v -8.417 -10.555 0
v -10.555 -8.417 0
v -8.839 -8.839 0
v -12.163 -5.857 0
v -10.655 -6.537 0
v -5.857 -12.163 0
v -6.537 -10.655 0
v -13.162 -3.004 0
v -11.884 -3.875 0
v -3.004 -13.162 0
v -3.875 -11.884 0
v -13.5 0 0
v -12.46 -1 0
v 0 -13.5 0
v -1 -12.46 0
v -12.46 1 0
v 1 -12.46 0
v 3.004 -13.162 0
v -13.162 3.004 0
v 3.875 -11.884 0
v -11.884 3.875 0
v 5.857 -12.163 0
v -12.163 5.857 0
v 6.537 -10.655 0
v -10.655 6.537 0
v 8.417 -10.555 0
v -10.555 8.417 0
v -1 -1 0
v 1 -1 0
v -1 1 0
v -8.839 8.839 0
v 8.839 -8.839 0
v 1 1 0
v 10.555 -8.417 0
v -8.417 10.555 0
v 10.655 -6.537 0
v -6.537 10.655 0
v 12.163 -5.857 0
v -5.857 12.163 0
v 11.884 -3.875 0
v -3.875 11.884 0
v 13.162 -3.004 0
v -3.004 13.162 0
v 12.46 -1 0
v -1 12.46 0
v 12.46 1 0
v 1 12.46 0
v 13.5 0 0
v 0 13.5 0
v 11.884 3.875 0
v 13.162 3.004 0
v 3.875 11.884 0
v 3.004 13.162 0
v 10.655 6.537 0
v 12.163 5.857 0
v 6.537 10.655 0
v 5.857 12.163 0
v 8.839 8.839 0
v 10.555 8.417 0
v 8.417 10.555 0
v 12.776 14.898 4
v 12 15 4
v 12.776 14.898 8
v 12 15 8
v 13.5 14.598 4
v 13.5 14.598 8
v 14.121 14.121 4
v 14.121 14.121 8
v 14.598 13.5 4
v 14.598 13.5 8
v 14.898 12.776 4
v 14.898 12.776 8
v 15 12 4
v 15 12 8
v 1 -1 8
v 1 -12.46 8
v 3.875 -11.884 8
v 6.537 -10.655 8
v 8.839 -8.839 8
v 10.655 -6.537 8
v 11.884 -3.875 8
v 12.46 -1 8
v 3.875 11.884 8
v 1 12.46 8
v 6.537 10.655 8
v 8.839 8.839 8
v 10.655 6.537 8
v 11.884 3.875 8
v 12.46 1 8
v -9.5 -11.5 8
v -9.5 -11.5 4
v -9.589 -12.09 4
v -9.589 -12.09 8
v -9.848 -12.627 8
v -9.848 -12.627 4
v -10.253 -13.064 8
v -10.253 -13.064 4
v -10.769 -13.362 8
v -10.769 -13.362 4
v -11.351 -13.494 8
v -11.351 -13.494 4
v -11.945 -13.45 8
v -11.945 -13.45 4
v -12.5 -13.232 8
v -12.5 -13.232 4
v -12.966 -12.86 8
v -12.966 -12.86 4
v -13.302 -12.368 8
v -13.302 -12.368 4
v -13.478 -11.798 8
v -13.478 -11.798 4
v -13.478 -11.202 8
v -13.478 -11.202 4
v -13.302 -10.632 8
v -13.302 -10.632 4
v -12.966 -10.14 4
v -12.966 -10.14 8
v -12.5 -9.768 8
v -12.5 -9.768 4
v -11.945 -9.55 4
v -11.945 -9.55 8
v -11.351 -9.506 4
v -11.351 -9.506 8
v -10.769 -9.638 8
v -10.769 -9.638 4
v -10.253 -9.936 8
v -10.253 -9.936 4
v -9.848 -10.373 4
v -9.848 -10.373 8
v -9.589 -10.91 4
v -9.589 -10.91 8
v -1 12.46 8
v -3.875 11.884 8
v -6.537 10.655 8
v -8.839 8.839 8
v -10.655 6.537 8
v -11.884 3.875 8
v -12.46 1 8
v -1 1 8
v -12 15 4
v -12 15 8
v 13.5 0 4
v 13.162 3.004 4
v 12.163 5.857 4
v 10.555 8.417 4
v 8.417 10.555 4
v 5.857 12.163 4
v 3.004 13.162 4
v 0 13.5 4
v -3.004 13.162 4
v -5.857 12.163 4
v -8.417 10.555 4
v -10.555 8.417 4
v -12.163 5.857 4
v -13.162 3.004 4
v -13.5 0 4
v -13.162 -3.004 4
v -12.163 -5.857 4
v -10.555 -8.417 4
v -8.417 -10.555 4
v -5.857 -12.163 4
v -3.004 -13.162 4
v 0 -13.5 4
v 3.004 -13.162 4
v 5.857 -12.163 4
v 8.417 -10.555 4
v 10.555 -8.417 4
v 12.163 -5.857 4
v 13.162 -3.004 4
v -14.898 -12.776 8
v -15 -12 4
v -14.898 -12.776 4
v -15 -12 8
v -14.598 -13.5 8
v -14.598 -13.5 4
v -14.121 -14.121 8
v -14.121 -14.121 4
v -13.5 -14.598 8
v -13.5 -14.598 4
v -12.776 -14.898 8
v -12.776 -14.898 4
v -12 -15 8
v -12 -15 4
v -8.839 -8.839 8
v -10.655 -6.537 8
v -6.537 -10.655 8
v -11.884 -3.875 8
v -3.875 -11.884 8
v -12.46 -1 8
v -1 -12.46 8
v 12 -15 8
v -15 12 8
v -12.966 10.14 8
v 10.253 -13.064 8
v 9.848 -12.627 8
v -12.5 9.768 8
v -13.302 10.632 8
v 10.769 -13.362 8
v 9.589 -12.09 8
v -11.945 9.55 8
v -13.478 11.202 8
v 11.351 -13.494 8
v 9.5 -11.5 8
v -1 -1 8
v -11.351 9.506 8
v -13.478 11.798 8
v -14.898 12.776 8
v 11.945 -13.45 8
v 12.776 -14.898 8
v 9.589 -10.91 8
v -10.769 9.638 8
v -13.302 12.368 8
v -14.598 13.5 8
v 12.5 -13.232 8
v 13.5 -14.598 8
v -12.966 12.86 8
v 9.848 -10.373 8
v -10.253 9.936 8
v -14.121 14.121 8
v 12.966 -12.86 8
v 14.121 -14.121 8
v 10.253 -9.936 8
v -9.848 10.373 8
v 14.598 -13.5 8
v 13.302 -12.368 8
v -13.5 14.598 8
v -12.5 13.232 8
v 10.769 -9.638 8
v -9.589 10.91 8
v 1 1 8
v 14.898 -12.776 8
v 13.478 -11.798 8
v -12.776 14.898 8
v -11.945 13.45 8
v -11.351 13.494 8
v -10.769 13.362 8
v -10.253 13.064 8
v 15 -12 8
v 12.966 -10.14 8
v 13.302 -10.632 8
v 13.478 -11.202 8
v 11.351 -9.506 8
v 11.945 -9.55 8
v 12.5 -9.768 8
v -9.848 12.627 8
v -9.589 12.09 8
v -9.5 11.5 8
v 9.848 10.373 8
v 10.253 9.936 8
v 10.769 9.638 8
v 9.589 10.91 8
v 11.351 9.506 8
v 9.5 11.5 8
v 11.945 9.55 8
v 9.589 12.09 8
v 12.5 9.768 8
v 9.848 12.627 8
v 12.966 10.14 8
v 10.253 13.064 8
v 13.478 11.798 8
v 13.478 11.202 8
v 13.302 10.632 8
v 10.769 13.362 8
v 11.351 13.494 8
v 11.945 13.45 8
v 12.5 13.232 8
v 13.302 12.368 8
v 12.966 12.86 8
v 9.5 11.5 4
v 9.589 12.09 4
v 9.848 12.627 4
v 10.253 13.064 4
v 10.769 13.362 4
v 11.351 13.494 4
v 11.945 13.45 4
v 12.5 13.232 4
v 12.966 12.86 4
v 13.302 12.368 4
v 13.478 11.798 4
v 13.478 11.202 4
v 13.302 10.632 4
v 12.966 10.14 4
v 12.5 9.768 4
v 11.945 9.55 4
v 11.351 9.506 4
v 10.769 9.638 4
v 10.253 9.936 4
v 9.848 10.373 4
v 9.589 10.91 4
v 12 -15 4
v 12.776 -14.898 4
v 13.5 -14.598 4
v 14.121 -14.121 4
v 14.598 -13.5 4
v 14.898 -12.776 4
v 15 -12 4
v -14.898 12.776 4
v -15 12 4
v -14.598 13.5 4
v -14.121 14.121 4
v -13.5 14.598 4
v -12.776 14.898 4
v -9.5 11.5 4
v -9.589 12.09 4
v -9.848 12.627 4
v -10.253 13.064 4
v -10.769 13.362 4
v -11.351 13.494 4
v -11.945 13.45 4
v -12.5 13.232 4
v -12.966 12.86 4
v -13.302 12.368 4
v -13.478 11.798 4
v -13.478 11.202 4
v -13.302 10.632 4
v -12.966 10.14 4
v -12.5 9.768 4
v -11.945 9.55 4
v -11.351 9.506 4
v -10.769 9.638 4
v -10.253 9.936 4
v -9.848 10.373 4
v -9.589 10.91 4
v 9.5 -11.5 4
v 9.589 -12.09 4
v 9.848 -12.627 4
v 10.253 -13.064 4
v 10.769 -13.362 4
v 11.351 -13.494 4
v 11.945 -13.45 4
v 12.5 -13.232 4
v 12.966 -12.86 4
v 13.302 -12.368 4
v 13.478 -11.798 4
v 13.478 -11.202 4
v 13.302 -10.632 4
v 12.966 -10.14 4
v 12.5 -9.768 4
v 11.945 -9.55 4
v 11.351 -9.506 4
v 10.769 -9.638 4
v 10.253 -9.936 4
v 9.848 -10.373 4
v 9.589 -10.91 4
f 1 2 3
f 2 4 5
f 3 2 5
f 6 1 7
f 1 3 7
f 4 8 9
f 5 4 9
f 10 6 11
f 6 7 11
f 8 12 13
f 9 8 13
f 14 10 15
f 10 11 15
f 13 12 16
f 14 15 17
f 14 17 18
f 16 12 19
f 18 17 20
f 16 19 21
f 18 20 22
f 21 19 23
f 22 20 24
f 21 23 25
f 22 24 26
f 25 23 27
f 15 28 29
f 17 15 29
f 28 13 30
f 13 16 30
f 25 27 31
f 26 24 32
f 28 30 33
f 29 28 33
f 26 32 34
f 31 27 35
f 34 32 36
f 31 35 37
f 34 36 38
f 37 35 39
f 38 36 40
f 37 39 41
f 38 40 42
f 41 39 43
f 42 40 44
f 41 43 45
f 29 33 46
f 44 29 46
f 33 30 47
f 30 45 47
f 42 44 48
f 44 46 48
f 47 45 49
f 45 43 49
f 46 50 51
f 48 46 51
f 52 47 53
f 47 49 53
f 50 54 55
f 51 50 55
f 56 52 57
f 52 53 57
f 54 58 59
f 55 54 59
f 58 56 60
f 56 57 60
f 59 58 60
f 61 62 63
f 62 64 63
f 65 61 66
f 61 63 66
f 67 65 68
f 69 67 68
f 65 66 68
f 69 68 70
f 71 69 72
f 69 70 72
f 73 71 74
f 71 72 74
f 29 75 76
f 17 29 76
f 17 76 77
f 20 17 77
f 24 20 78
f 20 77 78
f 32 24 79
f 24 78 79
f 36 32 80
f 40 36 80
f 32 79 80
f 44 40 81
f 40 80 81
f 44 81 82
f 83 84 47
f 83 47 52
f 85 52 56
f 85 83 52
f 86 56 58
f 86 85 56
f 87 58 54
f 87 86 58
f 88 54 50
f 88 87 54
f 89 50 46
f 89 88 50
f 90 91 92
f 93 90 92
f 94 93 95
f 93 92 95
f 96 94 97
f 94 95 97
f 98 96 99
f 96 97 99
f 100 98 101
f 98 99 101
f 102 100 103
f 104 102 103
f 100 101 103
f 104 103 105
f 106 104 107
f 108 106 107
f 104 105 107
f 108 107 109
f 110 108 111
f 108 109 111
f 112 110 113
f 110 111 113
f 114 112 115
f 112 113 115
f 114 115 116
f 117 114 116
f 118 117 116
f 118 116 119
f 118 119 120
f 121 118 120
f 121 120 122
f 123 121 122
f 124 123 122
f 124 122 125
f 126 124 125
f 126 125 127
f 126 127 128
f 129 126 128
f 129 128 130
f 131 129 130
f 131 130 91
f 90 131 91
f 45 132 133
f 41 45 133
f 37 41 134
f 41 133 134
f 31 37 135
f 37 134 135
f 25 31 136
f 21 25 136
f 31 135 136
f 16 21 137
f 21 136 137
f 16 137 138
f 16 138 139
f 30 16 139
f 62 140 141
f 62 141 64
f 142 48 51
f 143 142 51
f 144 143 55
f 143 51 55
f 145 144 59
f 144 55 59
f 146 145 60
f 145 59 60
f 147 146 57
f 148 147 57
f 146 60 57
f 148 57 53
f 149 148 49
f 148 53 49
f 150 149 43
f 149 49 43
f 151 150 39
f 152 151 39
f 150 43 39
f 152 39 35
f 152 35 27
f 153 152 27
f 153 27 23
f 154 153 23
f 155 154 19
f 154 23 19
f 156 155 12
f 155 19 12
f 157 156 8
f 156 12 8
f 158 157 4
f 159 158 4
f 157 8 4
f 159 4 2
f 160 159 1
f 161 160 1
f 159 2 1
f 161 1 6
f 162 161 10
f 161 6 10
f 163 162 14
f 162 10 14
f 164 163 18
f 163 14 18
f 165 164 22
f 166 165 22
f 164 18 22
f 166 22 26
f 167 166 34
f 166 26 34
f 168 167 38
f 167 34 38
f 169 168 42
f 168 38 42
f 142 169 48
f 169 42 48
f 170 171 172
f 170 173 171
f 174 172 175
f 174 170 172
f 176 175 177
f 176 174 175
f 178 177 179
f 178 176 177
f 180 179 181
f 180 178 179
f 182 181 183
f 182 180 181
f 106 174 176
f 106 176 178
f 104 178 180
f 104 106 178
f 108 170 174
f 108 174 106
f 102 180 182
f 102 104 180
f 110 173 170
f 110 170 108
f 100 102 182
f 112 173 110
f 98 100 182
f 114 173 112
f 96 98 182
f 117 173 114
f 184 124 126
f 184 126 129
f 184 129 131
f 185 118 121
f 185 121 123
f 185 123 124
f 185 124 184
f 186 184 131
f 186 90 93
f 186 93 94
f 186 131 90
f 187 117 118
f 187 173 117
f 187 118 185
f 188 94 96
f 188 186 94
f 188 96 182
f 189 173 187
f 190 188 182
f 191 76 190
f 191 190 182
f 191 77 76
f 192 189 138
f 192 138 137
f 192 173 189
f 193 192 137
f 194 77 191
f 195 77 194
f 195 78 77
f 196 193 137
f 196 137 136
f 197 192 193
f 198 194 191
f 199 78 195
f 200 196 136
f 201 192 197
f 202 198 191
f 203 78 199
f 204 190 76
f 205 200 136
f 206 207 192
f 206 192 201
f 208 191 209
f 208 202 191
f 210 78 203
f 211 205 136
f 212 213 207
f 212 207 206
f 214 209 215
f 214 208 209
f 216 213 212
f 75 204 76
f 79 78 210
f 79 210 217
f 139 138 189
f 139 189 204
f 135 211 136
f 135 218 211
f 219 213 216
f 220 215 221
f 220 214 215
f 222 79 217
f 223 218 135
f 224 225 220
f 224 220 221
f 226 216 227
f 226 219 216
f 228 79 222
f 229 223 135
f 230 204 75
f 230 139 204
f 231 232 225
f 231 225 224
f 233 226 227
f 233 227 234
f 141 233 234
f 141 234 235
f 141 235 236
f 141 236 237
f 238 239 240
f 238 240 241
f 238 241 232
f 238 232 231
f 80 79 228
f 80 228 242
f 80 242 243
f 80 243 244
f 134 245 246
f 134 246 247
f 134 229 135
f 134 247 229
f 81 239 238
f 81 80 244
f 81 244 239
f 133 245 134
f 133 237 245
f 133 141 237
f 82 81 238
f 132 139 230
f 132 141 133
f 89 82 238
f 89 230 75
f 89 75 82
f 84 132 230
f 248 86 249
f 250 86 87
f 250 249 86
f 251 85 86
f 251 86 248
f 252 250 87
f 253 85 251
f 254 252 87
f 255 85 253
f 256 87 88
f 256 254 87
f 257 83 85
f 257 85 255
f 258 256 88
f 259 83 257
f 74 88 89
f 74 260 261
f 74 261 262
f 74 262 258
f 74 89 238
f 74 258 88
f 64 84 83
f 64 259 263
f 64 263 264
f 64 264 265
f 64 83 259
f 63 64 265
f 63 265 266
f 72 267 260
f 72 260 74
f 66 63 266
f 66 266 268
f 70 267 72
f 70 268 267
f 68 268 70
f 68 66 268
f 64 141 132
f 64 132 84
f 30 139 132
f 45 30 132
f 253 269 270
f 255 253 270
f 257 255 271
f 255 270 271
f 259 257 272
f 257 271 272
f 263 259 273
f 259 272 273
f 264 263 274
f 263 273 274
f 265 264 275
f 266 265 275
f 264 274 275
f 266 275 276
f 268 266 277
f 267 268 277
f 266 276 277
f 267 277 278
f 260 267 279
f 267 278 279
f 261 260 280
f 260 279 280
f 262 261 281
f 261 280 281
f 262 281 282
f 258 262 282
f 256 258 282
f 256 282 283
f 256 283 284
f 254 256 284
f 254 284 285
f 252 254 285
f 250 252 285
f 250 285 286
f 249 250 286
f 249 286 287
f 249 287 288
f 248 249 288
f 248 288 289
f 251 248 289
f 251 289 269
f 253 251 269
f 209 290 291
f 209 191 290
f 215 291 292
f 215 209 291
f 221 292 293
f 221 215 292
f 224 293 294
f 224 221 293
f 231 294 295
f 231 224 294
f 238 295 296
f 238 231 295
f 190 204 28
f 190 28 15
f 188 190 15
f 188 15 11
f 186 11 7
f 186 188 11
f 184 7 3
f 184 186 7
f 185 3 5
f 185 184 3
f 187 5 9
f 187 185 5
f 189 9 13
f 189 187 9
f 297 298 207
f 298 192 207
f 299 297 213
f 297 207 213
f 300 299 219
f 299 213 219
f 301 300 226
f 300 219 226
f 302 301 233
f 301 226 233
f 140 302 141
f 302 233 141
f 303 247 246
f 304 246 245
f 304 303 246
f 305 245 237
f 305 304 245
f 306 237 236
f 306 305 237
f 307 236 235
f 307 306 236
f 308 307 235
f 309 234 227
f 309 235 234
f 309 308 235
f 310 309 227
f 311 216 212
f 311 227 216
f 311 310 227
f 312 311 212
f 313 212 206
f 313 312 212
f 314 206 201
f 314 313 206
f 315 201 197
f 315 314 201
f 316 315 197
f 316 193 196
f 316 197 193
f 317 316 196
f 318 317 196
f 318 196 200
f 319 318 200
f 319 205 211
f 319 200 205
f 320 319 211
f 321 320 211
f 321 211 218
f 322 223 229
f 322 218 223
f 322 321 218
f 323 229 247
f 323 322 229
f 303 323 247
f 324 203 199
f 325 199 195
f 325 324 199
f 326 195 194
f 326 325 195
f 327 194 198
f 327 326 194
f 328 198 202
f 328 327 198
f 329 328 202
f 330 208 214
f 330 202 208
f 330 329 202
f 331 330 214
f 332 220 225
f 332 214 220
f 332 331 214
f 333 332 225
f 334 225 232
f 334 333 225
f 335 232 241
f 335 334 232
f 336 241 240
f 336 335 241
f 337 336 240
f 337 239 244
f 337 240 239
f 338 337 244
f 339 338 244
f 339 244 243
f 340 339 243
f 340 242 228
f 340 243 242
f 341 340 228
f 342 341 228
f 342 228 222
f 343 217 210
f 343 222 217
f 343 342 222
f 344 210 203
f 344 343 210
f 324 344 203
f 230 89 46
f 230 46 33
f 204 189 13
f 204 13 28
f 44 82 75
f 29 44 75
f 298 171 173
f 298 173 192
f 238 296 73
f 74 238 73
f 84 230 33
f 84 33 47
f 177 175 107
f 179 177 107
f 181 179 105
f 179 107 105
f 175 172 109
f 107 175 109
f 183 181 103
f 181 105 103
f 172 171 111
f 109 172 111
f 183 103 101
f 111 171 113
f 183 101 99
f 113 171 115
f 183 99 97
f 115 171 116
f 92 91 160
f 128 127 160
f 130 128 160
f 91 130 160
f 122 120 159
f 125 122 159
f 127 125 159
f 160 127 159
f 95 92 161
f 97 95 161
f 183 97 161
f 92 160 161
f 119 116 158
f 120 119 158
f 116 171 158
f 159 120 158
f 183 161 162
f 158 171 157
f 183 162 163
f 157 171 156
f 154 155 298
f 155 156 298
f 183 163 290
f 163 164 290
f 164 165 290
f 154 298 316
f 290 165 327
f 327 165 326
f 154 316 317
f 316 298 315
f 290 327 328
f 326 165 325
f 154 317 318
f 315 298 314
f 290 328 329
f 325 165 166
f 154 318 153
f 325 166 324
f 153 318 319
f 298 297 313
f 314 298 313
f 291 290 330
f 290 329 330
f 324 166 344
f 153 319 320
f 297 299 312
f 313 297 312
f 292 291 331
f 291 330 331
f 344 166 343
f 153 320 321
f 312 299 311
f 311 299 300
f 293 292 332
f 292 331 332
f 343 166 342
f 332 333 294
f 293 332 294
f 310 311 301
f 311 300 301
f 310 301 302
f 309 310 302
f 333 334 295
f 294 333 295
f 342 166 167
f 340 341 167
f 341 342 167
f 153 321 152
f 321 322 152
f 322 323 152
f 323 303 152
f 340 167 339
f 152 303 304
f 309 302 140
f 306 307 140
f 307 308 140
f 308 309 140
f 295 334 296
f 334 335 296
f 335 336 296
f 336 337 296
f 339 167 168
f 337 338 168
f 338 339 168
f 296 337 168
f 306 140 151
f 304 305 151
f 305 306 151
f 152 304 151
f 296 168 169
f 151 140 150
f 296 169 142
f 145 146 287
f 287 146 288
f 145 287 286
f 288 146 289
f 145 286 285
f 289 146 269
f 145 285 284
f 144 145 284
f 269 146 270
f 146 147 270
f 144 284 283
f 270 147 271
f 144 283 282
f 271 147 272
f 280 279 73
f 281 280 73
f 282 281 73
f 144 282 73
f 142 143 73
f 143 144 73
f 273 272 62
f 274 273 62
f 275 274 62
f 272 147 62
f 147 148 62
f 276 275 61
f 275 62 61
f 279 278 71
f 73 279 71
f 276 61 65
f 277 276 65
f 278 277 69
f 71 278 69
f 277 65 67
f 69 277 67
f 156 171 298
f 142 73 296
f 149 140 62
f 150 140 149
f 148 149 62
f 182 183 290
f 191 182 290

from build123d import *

# Parameters (mm, degrees)
SKETCH1_R               = 13.5
BOSS_EXTRUDE1_DEPTH     = 4
SKETCH2_W               = 30
SKETCH2_H               = 30
BOSS_EXTRUDE2_DEPTH     = 4
FILLET1_R               = 3
CUT_EXTRUDE1_START      = -9
CUT_EXTRUDE1_DEPTH      = 17
MIRROR2_START           = -9
MIRROR2_COPY_1_DEPTH    = 17
SKETCH5_R               = 2
CUT_EXTRUDE2_DEPTH      = 8
MIRROR4_COPY_1_SKETCH_R = 2
MIRROR4_COPY_1_DEPTH    = 8


with BuildPart() as part:
    # Sketch1 → Boss-Extrude1 (new body)
    with BuildSketch(Plane.XY):
        Circle(SKETCH1_R)
    extrude(amount=BOSS_EXTRUDE1_DEPTH)

    # Sketch2 → Boss-Extrude2 (add)
    with BuildSketch(Plane.XY.offset(4)):
        Rectangle(SKETCH2_W, SKETCH2_H)
    extrude(amount=BOSS_EXTRUDE2_DEPTH)

    # Fillet1
    fillet1_edges = [part.edges().sort_by_distance(p)[0] for p in [
        (15, -15, 6),
        (15, 15, 6),
        (-15, 15, 6),
        (-15, -15, 6),
    ]]
    fillet(fillet1_edges, radius=FILLET1_R)

    # Sketch4 → Cut-Extrude1 (cut)
    with BuildSketch(Plane(origin=(0, 0, 0), x_dir=(-1, 0, 0), z_dir=(0, 0, -1)).offset(CUT_EXTRUDE1_START)):
        with BuildLine():
            Line((-12.459935794, 1), (-1, 1))
            Line((-1, 1), (-1, 12.459935794))
            ThreePointArc((-1, 12.459935794), (-8.838834765, 8.838834765), (-12.459935794, 1))
        make_face()
    cut_extrude1 = extrude(amount=CUT_EXTRUDE1_DEPTH, mode=Mode.SUBTRACT)

    # Mirror1: Cut-Extrude1 across plane
    add(cut_extrude1.mirror(Plane(origin=(0, 0, 0), x_dir=(0, 0, 1), z_dir=(1, 0, 0))), mode=Mode.SUBTRACT)

    # Mirror2: Cut-Extrude1 across plane
    add(cut_extrude1.mirror(Plane.ZX), mode=Mode.SUBTRACT)

    # Mirror2 copy 1 sketch → Mirror2 copy 1 (cut)
    with BuildSketch(Plane(origin=(0, 0, 0), x_dir=(1, 0, 0), z_dir=(0, 0, -1)).offset(MIRROR2_START)):
        with BuildLine():
            Line((-12.459935794, 1), (-1, 1))
            Line((-1, 1), (-1, 12.459935794))
            ThreePointArc((-1, 12.459935794), (-8.838834765, 8.838834765), (-12.459935794, 1))
        make_face()
    extrude(amount=MIRROR2_COPY_1_DEPTH, mode=Mode.SUBTRACT)

    # Sketch5 → Cut-Extrude2 (cut)
    with BuildSketch(Plane(origin=(0, 0, 4), x_dir=(-1, 0, 0), z_dir=(0, 0, -1))):
        with Locations((-11.5, 11.5)):
            Circle(SKETCH5_R)
    cut_extrude2 = extrude(amount=-CUT_EXTRUDE2_DEPTH, mode=Mode.SUBTRACT)

    # Mirror3: Cut-Extrude2 across plane
    add(cut_extrude2.mirror(Plane.ZX), mode=Mode.SUBTRACT)

    # Mirror4: Cut-Extrude2 across plane
    add(cut_extrude2.mirror(Plane(origin=(0, 0, 0), x_dir=(0, 0, 1), z_dir=(1, 0, 0))), mode=Mode.SUBTRACT)

    # Mirror4 copy 1 sketch → Mirror4 copy 1 (cut)
    with BuildSketch(Plane(origin=(0, 0, 4), x_dir=(1, 0, 0), z_dir=(0, 0, -1))):
        with Locations((-11.5, 11.5)):
            Circle(MIRROR4_COPY_1_SKETCH_R)
    extrude(amount=-MIRROR4_COPY_1_DEPTH, mode=Mode.SUBTRACT)


solid = part.part
